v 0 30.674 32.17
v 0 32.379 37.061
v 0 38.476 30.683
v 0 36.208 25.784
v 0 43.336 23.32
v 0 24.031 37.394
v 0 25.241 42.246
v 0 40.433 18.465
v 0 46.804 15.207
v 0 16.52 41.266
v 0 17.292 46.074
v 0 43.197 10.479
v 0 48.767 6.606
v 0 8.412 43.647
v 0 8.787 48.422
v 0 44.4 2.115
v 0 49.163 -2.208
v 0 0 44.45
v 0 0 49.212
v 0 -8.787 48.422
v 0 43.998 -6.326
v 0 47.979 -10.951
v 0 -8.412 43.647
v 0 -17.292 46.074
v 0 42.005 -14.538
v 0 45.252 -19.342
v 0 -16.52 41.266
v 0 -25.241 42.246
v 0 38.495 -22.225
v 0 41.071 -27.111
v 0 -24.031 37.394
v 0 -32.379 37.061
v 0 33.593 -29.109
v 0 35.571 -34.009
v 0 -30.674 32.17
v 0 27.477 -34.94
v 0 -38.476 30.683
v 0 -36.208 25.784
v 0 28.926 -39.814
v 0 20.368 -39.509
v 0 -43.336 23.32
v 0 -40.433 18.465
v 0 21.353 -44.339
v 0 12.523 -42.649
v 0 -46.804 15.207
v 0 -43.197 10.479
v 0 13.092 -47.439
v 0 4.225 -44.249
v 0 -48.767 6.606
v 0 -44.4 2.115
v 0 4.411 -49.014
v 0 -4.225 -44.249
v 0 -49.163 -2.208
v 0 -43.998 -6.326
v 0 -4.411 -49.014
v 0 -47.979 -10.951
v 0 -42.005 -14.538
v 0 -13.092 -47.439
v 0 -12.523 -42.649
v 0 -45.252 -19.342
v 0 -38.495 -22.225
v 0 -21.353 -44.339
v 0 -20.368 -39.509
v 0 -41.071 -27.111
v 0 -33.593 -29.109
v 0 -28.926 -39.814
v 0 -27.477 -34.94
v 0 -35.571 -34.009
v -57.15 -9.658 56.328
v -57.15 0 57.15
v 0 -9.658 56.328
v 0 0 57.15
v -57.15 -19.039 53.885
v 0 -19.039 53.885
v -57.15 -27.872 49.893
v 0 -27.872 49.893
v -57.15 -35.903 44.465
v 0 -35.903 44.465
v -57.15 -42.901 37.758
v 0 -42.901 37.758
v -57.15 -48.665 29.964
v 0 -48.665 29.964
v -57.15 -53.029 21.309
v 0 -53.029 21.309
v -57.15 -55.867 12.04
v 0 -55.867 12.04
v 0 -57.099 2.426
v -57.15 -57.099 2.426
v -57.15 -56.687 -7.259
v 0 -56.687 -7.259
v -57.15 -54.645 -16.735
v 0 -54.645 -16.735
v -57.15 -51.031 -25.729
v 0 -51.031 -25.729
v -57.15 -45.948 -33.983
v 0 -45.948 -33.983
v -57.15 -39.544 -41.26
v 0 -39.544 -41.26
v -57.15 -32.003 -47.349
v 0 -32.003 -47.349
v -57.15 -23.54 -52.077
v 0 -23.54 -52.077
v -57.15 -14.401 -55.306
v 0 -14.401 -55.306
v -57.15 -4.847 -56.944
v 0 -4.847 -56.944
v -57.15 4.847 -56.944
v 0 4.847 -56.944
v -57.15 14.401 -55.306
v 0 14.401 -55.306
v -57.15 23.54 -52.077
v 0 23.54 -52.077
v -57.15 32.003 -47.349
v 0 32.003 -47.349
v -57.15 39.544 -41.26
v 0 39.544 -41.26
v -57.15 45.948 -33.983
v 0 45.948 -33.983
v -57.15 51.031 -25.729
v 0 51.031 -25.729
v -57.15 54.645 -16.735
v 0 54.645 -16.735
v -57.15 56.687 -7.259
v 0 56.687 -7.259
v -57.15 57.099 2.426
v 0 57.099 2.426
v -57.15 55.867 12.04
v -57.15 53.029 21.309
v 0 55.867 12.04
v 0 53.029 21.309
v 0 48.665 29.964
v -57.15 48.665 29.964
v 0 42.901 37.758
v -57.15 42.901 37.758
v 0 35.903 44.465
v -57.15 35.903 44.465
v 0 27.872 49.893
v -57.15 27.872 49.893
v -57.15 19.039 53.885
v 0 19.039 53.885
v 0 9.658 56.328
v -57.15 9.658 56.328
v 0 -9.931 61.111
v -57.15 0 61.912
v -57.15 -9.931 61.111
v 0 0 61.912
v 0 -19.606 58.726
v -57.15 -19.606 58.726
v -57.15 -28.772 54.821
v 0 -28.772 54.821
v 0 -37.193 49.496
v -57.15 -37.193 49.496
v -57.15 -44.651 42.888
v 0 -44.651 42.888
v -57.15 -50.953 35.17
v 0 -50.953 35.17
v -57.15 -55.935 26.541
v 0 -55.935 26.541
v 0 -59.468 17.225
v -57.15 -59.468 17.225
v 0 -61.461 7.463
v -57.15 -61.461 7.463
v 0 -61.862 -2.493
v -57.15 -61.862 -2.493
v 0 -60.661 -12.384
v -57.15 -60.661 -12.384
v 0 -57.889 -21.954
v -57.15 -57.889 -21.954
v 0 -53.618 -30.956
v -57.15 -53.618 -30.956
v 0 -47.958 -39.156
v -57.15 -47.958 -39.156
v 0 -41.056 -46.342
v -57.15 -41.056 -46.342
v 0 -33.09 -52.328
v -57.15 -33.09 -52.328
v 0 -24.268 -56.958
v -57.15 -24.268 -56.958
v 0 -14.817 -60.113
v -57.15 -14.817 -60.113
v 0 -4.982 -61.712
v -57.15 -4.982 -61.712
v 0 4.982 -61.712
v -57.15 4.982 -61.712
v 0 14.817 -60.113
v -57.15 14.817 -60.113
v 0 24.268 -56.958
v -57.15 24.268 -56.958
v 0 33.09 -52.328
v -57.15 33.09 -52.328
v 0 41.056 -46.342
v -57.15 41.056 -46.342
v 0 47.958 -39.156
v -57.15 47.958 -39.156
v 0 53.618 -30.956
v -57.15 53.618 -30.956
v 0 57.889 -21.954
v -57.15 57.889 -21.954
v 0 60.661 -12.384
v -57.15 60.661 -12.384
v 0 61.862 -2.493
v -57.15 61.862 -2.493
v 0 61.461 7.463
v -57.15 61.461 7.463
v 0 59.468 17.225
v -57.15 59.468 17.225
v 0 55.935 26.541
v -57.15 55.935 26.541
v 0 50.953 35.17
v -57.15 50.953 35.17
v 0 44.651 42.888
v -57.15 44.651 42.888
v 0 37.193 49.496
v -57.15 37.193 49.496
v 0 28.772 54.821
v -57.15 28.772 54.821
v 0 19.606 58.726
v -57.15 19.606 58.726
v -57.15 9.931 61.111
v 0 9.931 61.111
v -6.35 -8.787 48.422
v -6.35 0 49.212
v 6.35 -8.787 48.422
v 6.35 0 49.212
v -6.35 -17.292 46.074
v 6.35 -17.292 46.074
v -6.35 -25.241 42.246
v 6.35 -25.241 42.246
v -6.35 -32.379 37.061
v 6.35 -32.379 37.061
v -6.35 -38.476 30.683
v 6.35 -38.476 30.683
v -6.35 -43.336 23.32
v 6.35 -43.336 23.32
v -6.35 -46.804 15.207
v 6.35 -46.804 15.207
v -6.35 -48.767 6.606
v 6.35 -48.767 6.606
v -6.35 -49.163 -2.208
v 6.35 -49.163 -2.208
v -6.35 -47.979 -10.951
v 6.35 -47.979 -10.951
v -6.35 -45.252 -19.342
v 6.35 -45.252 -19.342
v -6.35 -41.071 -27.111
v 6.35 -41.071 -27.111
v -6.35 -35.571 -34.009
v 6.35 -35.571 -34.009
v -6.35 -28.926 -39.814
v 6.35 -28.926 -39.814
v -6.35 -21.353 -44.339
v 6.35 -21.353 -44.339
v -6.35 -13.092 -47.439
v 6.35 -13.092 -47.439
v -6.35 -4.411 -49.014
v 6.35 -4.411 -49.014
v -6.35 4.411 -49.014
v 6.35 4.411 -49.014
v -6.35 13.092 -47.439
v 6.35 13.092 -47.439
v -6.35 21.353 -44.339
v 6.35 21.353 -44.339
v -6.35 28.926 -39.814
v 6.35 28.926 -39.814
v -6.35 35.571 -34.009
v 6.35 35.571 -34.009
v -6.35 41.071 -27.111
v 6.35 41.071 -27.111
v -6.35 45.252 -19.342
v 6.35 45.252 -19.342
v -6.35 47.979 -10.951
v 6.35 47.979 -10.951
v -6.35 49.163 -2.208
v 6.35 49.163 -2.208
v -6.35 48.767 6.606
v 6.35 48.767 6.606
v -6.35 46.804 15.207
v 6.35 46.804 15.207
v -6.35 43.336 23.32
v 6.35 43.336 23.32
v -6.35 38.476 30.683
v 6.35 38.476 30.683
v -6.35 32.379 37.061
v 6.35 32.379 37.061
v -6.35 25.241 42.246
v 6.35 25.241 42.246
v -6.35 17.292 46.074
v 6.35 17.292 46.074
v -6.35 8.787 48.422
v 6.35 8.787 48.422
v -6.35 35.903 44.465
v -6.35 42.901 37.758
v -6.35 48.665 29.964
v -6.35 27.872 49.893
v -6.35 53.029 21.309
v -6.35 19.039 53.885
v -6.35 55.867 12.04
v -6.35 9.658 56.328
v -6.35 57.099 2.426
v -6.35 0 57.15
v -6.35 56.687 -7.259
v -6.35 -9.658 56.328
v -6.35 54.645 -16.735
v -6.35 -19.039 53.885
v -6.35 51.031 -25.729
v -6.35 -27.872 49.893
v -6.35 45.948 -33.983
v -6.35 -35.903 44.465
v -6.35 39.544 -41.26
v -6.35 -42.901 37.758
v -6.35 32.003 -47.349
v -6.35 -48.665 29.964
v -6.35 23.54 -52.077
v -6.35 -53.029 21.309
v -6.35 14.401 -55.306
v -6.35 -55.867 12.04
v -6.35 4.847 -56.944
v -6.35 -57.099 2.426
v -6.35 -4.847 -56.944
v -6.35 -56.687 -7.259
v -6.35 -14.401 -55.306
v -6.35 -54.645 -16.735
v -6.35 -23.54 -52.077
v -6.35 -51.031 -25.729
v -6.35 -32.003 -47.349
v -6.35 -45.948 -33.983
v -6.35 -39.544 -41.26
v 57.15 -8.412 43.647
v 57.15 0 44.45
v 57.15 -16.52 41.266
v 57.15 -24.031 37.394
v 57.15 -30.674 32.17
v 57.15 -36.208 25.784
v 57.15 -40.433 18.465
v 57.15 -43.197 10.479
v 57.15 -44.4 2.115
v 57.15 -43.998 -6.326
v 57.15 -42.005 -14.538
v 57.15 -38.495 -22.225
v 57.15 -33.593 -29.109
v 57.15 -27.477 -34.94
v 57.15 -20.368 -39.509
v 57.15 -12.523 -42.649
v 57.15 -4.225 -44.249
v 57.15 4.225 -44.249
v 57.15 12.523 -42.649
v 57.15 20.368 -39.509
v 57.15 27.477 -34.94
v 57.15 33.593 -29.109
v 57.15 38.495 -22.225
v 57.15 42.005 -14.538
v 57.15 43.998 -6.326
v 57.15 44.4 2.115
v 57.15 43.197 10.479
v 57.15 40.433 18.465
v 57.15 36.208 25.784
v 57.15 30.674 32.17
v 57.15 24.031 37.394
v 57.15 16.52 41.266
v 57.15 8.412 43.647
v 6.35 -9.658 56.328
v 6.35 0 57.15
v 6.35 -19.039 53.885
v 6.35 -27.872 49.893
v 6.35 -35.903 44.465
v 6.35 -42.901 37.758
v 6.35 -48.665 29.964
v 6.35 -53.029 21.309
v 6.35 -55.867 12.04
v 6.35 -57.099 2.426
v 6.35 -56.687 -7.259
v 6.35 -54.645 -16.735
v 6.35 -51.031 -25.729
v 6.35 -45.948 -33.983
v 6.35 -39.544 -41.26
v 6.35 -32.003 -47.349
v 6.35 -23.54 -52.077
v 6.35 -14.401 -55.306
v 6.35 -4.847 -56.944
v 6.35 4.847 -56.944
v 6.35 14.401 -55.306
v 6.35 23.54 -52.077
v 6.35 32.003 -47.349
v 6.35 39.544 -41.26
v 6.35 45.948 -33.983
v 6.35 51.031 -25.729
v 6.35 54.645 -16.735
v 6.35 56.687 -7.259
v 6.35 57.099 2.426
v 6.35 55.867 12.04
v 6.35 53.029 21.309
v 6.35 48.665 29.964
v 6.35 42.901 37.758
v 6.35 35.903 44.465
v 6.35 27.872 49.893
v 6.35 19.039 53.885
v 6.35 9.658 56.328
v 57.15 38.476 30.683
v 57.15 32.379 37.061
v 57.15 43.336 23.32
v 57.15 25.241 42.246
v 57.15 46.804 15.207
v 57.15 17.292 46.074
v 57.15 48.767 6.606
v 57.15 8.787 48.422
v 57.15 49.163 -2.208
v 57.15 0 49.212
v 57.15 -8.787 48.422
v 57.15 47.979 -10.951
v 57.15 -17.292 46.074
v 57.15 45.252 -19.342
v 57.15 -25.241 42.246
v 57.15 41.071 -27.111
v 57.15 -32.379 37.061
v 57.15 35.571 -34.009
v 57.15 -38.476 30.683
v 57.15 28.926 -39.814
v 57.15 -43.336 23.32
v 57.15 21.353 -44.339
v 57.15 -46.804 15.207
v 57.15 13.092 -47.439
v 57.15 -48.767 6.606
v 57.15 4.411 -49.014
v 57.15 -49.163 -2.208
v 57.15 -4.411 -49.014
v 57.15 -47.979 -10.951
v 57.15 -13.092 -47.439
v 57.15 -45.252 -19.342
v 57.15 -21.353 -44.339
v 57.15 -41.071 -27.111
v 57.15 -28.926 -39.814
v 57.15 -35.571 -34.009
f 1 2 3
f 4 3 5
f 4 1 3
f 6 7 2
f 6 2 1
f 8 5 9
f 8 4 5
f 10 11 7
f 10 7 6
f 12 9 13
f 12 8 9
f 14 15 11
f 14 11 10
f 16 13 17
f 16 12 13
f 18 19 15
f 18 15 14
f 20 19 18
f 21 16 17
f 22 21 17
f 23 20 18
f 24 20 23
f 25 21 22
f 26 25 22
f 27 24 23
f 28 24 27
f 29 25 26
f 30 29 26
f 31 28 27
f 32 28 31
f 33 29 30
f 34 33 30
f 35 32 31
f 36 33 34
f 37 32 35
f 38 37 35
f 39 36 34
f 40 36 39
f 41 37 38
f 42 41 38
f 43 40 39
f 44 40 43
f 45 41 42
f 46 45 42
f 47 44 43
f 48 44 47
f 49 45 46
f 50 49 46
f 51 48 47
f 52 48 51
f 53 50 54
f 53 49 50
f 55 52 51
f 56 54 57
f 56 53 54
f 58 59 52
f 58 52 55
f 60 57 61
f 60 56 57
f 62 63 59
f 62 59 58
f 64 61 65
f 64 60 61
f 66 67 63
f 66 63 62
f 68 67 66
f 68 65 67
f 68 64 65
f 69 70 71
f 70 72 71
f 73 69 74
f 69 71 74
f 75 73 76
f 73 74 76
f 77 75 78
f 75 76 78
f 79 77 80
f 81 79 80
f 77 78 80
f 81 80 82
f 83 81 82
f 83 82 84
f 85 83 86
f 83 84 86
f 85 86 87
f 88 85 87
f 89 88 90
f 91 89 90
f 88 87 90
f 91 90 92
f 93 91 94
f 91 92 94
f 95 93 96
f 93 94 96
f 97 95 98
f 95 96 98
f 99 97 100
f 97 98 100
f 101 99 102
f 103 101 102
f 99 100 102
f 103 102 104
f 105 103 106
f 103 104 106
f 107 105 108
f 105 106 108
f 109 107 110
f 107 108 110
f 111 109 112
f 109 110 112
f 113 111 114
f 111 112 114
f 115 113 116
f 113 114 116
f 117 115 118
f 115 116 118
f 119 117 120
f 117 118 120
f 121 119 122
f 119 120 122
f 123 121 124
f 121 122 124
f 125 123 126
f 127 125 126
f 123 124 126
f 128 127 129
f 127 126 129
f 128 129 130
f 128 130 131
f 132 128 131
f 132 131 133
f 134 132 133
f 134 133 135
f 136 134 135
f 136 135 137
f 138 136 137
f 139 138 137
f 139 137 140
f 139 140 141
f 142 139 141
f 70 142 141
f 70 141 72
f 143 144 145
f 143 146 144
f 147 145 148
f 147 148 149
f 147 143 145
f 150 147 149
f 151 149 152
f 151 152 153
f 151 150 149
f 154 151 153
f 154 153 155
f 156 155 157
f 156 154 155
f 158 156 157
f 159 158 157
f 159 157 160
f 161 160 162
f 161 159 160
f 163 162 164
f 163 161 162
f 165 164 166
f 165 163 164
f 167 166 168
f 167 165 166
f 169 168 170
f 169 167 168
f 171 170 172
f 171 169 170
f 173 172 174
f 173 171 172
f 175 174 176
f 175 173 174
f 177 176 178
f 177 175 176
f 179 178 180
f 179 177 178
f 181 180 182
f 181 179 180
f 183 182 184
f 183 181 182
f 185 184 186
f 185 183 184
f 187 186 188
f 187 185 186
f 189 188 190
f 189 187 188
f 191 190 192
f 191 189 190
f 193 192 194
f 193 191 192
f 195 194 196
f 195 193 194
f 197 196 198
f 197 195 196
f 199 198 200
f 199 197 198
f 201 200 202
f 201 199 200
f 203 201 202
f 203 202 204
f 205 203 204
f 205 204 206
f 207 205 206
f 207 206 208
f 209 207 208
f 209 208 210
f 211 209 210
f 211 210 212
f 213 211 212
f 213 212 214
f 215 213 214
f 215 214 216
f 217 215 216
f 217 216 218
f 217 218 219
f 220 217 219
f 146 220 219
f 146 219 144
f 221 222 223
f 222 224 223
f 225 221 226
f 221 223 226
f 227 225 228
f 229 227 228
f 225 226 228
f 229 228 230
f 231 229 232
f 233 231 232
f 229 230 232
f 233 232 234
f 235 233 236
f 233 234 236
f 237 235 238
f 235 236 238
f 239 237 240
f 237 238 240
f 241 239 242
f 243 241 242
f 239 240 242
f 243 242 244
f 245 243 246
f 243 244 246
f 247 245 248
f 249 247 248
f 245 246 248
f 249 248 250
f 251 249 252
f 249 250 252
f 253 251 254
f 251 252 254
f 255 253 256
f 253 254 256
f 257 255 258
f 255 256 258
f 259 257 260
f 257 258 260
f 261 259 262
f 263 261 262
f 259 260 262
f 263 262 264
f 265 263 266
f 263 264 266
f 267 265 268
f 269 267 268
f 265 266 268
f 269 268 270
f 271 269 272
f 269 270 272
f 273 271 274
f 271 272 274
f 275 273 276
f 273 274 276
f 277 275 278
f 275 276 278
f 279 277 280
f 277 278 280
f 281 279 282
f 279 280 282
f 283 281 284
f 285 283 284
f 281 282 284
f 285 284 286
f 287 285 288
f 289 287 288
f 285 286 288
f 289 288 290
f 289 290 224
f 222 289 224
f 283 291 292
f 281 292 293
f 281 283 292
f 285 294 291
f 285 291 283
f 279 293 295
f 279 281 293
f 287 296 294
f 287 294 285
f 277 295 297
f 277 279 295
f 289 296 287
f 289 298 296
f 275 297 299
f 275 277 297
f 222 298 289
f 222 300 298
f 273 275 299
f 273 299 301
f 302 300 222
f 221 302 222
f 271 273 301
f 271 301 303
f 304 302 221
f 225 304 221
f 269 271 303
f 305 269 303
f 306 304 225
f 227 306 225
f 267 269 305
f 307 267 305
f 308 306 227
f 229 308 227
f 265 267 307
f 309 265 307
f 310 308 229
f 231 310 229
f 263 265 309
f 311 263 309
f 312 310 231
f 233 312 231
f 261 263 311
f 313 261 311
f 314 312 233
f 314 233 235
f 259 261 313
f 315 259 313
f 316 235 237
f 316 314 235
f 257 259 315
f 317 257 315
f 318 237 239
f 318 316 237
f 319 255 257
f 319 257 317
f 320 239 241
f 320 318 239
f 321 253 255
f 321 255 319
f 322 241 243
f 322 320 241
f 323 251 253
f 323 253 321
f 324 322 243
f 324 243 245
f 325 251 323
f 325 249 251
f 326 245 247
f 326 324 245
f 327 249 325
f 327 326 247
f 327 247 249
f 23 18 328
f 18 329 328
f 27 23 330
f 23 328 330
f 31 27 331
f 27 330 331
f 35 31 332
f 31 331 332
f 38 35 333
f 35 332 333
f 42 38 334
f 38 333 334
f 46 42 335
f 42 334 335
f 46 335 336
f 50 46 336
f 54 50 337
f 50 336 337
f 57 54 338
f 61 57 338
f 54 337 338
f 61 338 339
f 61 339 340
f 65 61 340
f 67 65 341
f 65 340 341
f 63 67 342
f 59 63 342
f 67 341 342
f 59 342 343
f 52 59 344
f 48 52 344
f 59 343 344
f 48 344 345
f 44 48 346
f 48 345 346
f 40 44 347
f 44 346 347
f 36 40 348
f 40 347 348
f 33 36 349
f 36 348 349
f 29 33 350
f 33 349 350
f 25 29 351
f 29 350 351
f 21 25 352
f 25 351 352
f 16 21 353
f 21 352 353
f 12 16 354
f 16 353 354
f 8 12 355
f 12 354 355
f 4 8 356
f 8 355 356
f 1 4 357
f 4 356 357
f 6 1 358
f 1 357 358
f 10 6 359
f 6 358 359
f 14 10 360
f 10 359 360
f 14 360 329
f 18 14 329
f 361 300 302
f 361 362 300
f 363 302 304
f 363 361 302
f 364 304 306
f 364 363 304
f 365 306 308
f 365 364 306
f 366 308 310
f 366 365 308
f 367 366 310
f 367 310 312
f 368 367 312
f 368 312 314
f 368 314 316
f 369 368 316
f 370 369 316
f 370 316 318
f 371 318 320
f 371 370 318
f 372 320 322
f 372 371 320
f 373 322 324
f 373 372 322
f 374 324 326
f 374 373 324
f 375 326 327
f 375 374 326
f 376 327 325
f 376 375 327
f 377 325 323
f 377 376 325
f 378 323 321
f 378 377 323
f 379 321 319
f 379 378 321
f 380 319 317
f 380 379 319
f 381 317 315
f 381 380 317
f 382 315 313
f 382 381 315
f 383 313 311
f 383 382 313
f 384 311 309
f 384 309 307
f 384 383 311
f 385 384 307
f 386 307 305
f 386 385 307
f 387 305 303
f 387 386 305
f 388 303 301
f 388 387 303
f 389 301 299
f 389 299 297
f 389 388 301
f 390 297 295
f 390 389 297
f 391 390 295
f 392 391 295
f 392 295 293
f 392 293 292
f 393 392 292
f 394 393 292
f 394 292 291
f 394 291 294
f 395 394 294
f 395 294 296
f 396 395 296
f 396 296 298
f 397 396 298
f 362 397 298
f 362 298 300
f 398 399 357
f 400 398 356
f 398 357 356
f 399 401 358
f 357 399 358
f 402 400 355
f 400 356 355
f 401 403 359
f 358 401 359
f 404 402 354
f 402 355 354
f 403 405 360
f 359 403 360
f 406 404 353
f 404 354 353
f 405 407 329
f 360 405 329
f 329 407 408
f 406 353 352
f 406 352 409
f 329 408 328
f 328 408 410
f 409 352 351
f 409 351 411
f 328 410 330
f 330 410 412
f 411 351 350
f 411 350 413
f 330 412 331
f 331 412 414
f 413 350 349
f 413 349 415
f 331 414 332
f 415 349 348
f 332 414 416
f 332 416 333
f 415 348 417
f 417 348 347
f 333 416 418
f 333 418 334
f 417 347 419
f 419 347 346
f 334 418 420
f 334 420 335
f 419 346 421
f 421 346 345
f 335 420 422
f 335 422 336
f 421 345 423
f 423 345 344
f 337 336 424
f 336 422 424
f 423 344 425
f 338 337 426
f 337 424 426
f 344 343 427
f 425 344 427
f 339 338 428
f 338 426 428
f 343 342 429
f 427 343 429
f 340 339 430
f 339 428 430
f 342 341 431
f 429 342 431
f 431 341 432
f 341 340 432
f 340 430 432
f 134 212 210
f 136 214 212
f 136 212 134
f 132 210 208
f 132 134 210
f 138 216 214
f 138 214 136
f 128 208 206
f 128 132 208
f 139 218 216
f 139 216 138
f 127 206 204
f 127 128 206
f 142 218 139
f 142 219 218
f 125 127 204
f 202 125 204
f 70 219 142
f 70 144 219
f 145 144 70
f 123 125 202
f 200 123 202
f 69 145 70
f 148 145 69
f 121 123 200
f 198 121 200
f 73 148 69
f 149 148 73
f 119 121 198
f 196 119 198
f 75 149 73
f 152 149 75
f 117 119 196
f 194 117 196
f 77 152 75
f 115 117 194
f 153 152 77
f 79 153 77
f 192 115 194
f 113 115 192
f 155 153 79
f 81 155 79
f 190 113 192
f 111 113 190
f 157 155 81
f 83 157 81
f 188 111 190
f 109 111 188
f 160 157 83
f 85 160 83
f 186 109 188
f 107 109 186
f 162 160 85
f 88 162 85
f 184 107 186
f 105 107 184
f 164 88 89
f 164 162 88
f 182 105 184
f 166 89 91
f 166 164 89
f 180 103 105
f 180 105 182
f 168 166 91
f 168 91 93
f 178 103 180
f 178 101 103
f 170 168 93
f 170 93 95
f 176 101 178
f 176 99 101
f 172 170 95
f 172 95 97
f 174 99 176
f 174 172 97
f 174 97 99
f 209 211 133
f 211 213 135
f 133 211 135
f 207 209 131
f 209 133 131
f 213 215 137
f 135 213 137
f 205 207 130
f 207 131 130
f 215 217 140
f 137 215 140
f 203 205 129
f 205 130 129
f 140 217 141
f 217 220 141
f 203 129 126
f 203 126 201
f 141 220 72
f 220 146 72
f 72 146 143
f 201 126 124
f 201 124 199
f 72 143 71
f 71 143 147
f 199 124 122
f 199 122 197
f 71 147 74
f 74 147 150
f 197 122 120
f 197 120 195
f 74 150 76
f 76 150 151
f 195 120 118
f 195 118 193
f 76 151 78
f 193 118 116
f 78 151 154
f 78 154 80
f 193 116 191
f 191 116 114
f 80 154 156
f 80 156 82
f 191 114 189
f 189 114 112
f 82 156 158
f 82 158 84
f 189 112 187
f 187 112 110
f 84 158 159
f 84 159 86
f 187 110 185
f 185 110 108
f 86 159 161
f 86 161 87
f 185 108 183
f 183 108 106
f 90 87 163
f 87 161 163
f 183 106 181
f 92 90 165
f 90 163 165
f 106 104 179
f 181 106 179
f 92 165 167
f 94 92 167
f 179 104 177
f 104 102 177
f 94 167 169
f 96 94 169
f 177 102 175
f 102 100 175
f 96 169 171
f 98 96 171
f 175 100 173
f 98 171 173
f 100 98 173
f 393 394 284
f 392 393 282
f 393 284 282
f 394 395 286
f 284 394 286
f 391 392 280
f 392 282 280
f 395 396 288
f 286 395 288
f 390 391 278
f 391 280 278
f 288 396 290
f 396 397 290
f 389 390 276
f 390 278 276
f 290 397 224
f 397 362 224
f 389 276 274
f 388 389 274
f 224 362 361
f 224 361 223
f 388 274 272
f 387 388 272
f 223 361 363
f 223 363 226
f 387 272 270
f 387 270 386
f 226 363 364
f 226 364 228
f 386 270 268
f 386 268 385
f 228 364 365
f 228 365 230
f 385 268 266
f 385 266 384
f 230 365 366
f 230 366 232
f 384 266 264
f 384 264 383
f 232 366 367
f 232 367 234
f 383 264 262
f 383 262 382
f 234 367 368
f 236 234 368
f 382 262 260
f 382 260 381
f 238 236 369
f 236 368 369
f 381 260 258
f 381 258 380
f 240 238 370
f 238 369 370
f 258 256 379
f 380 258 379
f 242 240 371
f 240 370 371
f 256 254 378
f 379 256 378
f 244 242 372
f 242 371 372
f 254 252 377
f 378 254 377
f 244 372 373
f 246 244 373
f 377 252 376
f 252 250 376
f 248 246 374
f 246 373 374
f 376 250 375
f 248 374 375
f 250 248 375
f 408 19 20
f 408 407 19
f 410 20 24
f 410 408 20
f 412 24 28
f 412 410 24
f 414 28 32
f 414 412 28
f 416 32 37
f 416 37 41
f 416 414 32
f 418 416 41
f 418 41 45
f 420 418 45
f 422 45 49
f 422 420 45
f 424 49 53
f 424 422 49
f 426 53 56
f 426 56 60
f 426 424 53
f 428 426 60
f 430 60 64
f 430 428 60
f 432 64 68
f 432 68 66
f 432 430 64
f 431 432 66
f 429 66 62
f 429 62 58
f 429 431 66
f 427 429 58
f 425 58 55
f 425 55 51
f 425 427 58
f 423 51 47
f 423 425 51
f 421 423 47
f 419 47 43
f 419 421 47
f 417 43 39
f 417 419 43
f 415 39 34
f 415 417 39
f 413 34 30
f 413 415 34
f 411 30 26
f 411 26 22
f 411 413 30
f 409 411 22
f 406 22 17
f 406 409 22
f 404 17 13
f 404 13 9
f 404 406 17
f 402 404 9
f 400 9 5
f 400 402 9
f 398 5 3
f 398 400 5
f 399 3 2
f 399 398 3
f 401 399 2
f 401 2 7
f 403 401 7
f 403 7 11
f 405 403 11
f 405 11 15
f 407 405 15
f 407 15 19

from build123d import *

# Parameters (mm, degrees)
SKETCH1_W = 12.7
SKETCH1_H = 7.9375
SKETCH2_W = 57.15
SKETCH2_H = 4.7625


with BuildPart() as part:
    # Sketch1 → Revolve1 (revolve)
    with BuildSketch(Plane.XY, mode=Mode.PRIVATE) as revolve1_sk:
        with Locations((0, 53.18125)):
            Rectangle(SKETCH1_W, SKETCH1_H)
    revolve(revolve1_sk.sketch.rotate(Axis((0, 0, 0), (1, 0, 0)), 90), axis=Axis((0, 0, 0), (1, 0, 0)))  # turned: the seam where the file's is


with BuildPart() as body_2:
    # Sketch2 → Revolve2 (revolve)
    with BuildSketch(Plane.XY, mode=Mode.PRIVATE) as revolve2_sk:
        with Locations((-28.575, 59.53125)):
            Rectangle(SKETCH2_W, SKETCH2_H)
        with Locations((28.575, 46.83125)):
            Rectangle(SKETCH2_W, SKETCH2_H)
    revolve(revolve2_sk.sketch.rotate(Axis((0, 0, 0), (1, 0, 0)), 90), axis=Axis((0, 0, 0), (1, 0, 0)))  # turned: the seam where the file's is


solid = Compound([part.part, body_2.part])
